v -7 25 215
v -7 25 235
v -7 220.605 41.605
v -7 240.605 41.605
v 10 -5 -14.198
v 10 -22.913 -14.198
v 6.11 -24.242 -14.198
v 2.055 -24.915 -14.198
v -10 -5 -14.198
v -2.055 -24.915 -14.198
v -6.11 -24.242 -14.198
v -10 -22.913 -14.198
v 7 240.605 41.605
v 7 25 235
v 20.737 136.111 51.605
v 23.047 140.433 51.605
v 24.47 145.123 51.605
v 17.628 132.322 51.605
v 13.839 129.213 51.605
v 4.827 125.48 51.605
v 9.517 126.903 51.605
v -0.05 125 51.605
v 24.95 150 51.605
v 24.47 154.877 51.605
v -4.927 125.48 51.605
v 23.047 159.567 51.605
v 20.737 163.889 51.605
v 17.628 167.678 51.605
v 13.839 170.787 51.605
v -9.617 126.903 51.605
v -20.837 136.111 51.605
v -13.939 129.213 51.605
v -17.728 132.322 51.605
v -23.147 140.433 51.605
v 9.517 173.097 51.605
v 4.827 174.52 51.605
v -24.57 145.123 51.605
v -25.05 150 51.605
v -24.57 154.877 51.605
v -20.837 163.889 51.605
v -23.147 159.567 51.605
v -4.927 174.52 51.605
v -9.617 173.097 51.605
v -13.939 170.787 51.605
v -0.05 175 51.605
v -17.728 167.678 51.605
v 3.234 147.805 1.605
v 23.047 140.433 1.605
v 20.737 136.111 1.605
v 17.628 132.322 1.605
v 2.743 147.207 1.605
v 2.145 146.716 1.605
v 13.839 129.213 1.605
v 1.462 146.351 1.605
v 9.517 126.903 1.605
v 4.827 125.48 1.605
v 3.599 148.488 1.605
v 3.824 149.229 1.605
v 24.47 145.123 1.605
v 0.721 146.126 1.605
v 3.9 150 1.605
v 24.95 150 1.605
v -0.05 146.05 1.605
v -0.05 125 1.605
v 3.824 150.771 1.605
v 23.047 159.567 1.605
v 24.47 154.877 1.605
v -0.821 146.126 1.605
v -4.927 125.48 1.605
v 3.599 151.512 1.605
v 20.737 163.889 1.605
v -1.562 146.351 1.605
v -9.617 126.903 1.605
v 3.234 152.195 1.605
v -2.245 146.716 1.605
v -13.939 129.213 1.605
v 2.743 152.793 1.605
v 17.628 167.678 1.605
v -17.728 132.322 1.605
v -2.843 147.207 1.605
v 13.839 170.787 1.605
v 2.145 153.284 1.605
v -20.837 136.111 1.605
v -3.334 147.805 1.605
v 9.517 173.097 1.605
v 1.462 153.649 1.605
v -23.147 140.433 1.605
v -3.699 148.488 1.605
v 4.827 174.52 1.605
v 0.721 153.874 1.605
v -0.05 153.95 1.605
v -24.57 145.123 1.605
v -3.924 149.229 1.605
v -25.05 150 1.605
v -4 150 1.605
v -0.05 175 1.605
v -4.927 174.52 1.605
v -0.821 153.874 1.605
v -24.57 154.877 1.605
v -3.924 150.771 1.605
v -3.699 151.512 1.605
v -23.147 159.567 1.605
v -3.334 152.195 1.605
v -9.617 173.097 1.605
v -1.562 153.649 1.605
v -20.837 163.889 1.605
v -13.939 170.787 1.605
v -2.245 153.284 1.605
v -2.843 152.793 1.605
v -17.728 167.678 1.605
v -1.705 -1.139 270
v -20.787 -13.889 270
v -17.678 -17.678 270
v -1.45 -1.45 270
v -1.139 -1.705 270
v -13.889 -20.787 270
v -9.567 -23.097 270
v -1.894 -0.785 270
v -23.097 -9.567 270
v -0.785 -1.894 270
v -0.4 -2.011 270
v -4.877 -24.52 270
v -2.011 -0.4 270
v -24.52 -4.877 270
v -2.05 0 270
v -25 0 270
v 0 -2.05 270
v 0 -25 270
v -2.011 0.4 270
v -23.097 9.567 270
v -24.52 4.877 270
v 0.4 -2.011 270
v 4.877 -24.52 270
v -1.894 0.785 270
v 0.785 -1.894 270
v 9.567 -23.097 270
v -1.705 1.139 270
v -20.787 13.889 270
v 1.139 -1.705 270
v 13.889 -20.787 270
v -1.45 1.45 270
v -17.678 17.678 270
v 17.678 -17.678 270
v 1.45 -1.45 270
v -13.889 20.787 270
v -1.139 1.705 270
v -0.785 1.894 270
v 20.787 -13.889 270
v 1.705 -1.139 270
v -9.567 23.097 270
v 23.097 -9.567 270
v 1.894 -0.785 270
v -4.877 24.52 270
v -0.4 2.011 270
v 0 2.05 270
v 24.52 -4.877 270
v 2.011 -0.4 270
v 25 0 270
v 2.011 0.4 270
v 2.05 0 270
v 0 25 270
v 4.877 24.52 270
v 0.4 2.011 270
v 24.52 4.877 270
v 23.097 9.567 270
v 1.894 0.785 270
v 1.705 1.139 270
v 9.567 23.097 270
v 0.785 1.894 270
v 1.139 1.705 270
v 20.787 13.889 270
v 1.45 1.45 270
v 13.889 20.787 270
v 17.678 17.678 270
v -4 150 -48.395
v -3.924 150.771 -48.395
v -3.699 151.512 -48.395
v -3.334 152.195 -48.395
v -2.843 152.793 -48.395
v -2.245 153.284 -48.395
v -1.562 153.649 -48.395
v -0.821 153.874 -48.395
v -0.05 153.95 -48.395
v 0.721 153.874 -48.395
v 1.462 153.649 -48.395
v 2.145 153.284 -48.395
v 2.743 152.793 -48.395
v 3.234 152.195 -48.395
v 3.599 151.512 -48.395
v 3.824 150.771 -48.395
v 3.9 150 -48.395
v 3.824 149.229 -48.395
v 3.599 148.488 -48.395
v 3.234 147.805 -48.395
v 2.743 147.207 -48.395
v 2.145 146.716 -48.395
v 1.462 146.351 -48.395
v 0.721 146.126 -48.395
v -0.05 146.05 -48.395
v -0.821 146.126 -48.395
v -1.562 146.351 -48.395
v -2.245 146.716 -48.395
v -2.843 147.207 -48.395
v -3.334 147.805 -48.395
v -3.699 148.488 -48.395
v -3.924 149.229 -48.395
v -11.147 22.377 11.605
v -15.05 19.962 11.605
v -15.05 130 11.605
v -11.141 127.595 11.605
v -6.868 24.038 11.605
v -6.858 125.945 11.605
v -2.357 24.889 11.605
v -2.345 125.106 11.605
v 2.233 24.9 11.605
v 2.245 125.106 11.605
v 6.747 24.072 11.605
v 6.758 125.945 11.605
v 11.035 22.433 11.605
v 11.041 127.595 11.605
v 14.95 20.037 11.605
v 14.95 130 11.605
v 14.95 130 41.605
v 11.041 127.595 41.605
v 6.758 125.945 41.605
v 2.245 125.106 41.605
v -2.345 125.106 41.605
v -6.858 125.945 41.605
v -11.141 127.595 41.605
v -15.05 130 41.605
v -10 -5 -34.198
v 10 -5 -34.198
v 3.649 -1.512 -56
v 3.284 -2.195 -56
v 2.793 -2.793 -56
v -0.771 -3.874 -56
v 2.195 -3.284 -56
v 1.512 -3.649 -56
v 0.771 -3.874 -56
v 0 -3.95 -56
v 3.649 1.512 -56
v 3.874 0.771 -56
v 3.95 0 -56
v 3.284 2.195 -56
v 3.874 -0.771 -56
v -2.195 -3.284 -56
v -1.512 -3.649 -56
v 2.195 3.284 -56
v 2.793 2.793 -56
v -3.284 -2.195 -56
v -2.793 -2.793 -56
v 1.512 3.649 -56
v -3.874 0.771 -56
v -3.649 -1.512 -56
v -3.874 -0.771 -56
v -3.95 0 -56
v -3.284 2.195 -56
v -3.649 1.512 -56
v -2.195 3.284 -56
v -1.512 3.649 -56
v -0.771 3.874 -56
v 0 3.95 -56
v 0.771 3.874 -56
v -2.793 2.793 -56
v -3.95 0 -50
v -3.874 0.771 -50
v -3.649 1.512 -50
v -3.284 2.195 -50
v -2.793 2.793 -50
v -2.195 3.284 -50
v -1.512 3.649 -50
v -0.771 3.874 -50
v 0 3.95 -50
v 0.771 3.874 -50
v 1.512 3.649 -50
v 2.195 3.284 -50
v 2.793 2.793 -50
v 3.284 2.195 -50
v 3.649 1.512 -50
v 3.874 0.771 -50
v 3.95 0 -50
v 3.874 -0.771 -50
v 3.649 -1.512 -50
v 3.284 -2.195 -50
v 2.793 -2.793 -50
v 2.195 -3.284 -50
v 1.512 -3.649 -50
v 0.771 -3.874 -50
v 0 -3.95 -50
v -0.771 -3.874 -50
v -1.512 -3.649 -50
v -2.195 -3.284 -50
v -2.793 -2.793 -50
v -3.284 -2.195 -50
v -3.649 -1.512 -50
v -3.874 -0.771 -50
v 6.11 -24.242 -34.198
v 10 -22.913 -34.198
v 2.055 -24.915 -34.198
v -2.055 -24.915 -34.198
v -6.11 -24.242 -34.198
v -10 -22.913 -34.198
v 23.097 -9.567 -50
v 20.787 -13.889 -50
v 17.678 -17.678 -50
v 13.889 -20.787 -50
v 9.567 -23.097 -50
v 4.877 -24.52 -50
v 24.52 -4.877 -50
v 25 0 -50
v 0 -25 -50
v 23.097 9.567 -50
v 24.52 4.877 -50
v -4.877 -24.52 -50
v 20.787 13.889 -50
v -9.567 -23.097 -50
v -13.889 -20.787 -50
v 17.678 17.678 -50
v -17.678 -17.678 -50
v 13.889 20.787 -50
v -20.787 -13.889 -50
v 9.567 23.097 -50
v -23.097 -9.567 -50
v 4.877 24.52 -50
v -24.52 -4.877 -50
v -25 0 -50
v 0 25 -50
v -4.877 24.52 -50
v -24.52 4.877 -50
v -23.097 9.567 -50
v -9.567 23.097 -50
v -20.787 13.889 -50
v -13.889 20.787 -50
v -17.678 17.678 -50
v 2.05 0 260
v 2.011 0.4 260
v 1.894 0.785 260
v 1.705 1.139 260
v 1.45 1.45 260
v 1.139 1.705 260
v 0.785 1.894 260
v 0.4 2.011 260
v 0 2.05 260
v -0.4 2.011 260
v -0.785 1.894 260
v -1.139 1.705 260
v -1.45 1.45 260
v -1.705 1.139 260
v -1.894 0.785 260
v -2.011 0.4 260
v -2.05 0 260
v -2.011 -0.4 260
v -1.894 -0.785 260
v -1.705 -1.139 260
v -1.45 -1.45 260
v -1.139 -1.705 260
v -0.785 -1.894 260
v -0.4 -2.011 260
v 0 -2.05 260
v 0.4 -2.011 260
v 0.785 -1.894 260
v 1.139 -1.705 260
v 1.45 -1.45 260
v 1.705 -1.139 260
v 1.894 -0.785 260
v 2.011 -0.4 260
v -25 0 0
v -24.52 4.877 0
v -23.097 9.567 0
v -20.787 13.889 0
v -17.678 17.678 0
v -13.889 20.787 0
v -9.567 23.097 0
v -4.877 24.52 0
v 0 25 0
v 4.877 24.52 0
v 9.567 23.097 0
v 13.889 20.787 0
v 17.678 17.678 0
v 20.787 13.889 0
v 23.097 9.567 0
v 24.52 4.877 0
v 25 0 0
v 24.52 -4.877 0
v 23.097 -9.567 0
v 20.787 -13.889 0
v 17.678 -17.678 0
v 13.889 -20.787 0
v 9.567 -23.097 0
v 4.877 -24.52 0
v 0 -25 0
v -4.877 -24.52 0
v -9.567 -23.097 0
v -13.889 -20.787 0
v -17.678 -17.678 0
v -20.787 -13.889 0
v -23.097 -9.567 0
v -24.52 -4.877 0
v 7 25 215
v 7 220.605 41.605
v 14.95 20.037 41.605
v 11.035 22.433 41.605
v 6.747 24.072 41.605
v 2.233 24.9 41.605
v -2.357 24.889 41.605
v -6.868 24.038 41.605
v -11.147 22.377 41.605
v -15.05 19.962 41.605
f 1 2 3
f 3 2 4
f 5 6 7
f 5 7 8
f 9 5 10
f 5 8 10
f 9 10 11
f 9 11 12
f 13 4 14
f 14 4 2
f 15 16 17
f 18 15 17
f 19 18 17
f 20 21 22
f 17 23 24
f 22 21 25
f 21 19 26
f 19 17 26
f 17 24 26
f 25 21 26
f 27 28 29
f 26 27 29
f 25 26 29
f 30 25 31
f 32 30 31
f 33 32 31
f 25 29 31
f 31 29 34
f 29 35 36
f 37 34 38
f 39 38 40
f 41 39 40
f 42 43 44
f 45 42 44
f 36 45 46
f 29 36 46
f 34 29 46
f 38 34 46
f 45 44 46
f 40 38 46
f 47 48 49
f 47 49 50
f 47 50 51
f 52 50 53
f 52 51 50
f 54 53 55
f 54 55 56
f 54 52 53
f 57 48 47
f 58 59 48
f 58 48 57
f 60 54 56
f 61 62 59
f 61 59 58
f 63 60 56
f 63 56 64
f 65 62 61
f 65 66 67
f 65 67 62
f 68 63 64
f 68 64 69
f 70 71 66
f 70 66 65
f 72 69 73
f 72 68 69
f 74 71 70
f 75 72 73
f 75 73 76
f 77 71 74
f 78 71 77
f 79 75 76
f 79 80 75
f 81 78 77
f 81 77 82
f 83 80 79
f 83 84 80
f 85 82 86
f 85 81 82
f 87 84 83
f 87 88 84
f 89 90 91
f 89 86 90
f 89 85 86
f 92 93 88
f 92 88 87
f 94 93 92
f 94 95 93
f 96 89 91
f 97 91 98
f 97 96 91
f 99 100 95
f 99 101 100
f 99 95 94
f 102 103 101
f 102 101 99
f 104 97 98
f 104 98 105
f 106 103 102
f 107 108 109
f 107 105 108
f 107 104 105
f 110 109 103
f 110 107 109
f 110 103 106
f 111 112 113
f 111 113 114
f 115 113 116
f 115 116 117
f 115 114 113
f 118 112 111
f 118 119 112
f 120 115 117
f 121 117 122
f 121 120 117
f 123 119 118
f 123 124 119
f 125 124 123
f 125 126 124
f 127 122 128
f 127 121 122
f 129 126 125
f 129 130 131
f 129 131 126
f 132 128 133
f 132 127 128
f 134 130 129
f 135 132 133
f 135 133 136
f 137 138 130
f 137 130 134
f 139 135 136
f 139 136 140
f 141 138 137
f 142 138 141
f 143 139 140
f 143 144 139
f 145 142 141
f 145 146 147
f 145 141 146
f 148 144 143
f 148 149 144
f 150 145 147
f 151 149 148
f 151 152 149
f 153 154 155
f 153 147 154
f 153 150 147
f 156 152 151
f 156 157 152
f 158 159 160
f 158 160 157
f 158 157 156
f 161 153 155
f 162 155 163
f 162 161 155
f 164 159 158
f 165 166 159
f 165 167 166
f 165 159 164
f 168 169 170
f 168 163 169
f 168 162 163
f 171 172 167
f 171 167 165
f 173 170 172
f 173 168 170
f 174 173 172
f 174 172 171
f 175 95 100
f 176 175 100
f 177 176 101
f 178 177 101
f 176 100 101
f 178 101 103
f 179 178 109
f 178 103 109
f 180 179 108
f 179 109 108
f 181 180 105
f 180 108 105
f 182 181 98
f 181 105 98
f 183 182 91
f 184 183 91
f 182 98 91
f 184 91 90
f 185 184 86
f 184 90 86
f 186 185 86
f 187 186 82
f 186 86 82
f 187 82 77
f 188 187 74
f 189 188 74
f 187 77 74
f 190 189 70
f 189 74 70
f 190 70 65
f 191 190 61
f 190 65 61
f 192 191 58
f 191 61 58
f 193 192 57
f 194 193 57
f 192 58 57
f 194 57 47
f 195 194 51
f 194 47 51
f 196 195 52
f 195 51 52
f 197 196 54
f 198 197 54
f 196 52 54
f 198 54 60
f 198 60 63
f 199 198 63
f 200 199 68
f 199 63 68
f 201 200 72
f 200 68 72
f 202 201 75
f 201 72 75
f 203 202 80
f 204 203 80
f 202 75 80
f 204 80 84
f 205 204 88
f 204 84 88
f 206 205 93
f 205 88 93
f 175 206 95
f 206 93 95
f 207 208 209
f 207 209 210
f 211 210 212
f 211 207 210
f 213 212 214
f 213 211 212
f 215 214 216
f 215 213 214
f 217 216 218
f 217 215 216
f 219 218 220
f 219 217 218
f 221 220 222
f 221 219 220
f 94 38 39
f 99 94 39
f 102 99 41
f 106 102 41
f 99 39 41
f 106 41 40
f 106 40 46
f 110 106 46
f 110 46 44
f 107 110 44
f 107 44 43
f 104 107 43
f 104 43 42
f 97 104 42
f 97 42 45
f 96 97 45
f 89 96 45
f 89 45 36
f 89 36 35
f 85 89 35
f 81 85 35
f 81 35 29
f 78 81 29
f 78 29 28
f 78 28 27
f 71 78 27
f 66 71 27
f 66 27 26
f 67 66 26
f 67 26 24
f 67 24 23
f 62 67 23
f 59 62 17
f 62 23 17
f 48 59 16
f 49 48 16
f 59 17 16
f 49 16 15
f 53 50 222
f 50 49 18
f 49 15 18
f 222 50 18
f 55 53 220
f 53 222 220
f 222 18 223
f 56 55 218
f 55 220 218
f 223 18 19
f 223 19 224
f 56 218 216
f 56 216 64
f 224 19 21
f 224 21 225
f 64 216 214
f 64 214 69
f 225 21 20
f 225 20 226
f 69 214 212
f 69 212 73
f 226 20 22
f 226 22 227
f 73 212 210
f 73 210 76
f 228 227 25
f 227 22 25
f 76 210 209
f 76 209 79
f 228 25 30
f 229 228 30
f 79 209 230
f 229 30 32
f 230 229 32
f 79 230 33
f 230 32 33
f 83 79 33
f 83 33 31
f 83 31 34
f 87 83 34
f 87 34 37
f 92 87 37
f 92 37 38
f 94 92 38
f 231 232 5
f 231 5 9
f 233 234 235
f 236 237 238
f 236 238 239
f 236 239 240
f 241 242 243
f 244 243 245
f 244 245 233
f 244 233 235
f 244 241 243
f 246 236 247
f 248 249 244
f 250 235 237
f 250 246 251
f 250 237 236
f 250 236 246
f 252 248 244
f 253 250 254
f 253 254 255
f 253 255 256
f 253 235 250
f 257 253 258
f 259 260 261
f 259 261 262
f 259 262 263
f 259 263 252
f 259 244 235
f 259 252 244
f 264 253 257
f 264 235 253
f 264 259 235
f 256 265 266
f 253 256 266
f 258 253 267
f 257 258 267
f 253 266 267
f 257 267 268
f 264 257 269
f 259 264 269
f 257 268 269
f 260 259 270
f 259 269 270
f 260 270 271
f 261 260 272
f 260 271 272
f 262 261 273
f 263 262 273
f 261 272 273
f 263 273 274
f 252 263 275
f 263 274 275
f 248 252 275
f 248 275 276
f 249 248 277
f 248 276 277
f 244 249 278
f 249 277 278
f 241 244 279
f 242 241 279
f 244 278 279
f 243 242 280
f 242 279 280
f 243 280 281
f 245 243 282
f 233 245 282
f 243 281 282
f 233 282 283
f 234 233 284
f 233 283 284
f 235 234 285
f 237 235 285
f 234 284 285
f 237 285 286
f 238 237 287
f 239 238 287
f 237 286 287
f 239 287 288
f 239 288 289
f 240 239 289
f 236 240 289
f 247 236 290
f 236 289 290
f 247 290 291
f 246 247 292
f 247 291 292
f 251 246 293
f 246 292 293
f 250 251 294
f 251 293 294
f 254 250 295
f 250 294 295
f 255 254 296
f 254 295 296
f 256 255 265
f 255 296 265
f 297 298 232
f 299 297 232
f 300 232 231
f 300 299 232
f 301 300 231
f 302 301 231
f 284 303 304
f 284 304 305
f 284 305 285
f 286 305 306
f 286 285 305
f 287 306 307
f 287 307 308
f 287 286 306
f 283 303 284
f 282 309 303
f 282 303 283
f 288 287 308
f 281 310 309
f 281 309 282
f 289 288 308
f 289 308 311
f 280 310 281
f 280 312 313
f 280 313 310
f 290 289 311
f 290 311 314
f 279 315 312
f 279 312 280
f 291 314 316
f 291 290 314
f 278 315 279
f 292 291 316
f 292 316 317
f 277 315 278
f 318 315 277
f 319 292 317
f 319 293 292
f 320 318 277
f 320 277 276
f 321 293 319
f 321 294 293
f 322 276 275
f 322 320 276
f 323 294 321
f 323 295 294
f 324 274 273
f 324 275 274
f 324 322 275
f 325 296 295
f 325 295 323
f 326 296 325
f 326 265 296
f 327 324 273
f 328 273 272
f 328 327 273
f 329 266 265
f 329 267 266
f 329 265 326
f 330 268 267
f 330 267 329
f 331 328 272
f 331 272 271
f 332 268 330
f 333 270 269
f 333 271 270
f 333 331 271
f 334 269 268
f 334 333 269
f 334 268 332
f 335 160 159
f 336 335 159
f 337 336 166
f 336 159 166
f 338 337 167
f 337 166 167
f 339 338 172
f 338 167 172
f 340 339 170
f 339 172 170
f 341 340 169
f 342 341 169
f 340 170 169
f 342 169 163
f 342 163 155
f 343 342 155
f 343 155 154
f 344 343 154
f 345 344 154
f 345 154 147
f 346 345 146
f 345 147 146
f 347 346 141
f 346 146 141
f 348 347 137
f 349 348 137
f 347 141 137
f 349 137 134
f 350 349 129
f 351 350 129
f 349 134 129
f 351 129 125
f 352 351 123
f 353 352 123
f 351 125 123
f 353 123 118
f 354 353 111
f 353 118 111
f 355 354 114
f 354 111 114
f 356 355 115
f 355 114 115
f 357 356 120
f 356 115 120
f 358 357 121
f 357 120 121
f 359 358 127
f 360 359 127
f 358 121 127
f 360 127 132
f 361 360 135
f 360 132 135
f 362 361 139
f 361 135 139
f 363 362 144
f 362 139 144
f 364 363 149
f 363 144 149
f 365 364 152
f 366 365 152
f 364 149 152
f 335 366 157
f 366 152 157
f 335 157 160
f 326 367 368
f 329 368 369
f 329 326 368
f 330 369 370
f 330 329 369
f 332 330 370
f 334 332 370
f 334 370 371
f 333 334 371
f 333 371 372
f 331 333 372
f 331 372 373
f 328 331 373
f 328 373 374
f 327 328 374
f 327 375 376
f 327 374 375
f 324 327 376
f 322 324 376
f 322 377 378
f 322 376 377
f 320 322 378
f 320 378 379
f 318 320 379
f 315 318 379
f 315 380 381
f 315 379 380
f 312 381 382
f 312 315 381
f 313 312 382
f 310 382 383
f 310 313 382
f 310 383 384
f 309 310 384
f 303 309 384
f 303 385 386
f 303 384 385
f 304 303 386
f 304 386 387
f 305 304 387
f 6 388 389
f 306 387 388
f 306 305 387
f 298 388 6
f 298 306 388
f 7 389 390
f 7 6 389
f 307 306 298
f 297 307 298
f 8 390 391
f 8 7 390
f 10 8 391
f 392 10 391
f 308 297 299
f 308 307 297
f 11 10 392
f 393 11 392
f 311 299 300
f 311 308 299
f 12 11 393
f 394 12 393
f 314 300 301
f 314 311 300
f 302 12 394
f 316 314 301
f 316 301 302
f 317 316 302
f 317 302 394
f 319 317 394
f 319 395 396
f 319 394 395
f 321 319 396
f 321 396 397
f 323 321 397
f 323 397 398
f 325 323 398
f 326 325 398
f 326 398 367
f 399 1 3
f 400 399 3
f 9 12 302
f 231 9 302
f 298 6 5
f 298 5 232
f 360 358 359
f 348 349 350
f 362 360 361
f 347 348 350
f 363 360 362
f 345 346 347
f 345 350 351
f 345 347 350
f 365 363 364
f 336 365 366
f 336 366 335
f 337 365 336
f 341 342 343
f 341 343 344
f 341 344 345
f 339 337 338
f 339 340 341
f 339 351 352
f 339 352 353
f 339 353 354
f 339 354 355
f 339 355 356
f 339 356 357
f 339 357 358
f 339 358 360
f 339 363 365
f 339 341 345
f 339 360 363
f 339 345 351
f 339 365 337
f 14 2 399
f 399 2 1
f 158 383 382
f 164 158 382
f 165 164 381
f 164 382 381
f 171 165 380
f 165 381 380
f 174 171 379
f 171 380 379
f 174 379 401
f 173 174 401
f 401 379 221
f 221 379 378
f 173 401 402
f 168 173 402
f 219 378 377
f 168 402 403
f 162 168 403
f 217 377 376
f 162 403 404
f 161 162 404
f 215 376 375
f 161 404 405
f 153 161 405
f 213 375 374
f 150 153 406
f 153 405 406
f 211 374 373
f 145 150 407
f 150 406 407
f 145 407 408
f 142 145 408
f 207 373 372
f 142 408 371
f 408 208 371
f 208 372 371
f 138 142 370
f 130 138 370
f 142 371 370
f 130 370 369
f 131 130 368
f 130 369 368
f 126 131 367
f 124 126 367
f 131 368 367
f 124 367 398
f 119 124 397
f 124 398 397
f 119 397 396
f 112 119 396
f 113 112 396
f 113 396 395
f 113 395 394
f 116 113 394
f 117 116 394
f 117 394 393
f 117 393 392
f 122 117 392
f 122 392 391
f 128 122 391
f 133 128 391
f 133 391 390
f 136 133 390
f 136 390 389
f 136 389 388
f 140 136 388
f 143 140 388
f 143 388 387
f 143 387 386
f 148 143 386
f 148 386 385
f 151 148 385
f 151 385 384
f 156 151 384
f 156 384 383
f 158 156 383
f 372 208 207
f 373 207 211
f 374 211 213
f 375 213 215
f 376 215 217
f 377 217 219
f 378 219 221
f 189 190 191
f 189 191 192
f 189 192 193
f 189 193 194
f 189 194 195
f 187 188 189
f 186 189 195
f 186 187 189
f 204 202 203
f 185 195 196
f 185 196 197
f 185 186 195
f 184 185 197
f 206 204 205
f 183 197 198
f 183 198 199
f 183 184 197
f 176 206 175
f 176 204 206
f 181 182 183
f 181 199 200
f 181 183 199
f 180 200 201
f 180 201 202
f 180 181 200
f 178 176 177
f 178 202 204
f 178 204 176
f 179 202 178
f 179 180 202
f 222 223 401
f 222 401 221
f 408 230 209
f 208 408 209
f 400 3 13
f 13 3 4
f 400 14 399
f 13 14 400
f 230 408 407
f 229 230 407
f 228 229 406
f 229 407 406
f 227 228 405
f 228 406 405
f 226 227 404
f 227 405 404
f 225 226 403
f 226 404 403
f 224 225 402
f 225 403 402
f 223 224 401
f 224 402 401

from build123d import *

# Parameters (mm, degrees)
CROQUIS1_R                    = 25
SALIENTE_EXTRUIR1_DEPTH       = 270
CROQUIS2_W                    = 30
CROQUIS2_H                    = 30
SALIENTE_EXTRUIR13_DEPTH      = 150
SALIENTE_EXTRUIR14_DEPTH      = 10
SALIENTE_EXTRUIR14_DEPTH_BACK = 40
CROQUIS14_R                   = 25
SALIENTE_EXTRUIR15_DEPTH      = 7
SALIENTE_EXTRUIR15_DEPTH_BACK = 7
SALIENTE_EXTRUIR16_START      = 50
CROQUIS17_R                   = 25
SALIENTE_EXTRUIR16_DEPTH      = 50
CROQUIS19_R                   = 3.95
SALIENTE_EXTRUIR17_DEPTH      = 50
CROQUIS20_R                   = 3.95
SALIENTE_EXTRUIR18_DEPTH      = 6
CROQUIS21_R                   = 2.05
CORTAR_EXTRUIR2_DEPTH         = 10
CROQUIS22_W                   = 20
CROQUIS22_H                   = 20
CORTAR_EXTRUIR3_DEPTH         = 20


with BuildPart() as part:
    # Croquis1 → Saliente-Extruir1 (new body)
    with BuildSketch(Plane.XY):
        Circle(CROQUIS1_R)
    extrude(amount=SALIENTE_EXTRUIR1_DEPTH)

    # Croquis2 → Saliente-Extruir13 (add)
    with BuildSketch(Plane(origin=(0, 0, 0), x_dir=(1, 0, 0), z_dir=(0, 1, 0))):
        with Locations((-0.05, -26.604607898)):
            Rectangle(CROQUIS2_W, CROQUIS2_H)
    extrude(amount=SALIENTE_EXTRUIR13_DEPTH)

    # Croquis14 → Saliente-Extruir14 (add, two sides: drawn at the far end of the back side and taken through both)
    with BuildSketch(Plane(origin=(0, 0, 11.604607898), x_dir=(-1, 0, 0), z_dir=(0, 0, -1)).offset(-SALIENTE_EXTRUIR14_DEPTH_BACK)):
        with Locations((0.05, 150)):
            Circle(CROQUIS14_R)
    extrude(amount=SALIENTE_EXTRUIR14_DEPTH + SALIENTE_EXTRUIR14_DEPTH_BACK)

    # Croquis17 → Saliente-Extruir16 (add)
    with BuildSketch(Plane(origin=(0, 0, 0), x_dir=(-1, 0, 0), z_dir=(0, 0, -1)).offset(SALIENTE_EXTRUIR16_START)):
        Circle(CROQUIS17_R)
    extrude(amount=-SALIENTE_EXTRUIR16_DEPTH)

    # Croquis19 → Saliente-Extruir17 (add)
    with BuildSketch(Plane(origin=(0, 0, 1.604607898), x_dir=(-1, 0, 0), z_dir=(0, 0, -1))):
        with Locations((0.05, 150)):
            Circle(CROQUIS19_R)
    extrude(amount=SALIENTE_EXTRUIR17_DEPTH)

    # Croquis20 → Saliente-Extruir18 (add)
    with BuildSketch(Plane(origin=(0, 0, -50), x_dir=(-1, 0, 0), z_dir=(0, 0, -1))):
        Circle(CROQUIS20_R)
    extrude(amount=SALIENTE_EXTRUIR18_DEPTH)

    # Croquis21 → Cortar-Extruir2 (cut)
    with BuildSketch(Plane.XY.offset(270)):
        Circle(CROQUIS21_R)
    extrude(amount=-CORTAR_EXTRUIR2_DEPTH, mode=Mode.SUBTRACT)

    # Croquis22 → Cortar-Extruir3 (cut)
    with BuildSketch(Plane(origin=(0, -25, 0), x_dir=(-1, 0, 0), z_dir=(0, -1, 0))):
        with Locations((0, 24.197696051)):
            Rectangle(CROQUIS22_W, CROQUIS22_H)
    extrude(amount=-CORTAR_EXTRUIR3_DEPTH, mode=Mode.SUBTRACT)


with BuildPart() as body_2:
    # Croquis15 → Saliente-Extruir15 (new, two sides: drawn at the far end of the back side and taken through both)
    with BuildSketch(Plane(origin=(0, 0, 0), x_dir=(0, 0, -1), z_dir=(1, 0, 0)).offset(-SALIENTE_EXTRUIR15_DEPTH_BACK)):
        Polygon((-41.604607898, 240.604607898), (-235, 25), (-215, 25), (-41.604607898, 220.604607898), align=None)
    extrude(amount=SALIENTE_EXTRUIR15_DEPTH + SALIENTE_EXTRUIR15_DEPTH_BACK)


solid = Compound([part.part, body_2.part])
